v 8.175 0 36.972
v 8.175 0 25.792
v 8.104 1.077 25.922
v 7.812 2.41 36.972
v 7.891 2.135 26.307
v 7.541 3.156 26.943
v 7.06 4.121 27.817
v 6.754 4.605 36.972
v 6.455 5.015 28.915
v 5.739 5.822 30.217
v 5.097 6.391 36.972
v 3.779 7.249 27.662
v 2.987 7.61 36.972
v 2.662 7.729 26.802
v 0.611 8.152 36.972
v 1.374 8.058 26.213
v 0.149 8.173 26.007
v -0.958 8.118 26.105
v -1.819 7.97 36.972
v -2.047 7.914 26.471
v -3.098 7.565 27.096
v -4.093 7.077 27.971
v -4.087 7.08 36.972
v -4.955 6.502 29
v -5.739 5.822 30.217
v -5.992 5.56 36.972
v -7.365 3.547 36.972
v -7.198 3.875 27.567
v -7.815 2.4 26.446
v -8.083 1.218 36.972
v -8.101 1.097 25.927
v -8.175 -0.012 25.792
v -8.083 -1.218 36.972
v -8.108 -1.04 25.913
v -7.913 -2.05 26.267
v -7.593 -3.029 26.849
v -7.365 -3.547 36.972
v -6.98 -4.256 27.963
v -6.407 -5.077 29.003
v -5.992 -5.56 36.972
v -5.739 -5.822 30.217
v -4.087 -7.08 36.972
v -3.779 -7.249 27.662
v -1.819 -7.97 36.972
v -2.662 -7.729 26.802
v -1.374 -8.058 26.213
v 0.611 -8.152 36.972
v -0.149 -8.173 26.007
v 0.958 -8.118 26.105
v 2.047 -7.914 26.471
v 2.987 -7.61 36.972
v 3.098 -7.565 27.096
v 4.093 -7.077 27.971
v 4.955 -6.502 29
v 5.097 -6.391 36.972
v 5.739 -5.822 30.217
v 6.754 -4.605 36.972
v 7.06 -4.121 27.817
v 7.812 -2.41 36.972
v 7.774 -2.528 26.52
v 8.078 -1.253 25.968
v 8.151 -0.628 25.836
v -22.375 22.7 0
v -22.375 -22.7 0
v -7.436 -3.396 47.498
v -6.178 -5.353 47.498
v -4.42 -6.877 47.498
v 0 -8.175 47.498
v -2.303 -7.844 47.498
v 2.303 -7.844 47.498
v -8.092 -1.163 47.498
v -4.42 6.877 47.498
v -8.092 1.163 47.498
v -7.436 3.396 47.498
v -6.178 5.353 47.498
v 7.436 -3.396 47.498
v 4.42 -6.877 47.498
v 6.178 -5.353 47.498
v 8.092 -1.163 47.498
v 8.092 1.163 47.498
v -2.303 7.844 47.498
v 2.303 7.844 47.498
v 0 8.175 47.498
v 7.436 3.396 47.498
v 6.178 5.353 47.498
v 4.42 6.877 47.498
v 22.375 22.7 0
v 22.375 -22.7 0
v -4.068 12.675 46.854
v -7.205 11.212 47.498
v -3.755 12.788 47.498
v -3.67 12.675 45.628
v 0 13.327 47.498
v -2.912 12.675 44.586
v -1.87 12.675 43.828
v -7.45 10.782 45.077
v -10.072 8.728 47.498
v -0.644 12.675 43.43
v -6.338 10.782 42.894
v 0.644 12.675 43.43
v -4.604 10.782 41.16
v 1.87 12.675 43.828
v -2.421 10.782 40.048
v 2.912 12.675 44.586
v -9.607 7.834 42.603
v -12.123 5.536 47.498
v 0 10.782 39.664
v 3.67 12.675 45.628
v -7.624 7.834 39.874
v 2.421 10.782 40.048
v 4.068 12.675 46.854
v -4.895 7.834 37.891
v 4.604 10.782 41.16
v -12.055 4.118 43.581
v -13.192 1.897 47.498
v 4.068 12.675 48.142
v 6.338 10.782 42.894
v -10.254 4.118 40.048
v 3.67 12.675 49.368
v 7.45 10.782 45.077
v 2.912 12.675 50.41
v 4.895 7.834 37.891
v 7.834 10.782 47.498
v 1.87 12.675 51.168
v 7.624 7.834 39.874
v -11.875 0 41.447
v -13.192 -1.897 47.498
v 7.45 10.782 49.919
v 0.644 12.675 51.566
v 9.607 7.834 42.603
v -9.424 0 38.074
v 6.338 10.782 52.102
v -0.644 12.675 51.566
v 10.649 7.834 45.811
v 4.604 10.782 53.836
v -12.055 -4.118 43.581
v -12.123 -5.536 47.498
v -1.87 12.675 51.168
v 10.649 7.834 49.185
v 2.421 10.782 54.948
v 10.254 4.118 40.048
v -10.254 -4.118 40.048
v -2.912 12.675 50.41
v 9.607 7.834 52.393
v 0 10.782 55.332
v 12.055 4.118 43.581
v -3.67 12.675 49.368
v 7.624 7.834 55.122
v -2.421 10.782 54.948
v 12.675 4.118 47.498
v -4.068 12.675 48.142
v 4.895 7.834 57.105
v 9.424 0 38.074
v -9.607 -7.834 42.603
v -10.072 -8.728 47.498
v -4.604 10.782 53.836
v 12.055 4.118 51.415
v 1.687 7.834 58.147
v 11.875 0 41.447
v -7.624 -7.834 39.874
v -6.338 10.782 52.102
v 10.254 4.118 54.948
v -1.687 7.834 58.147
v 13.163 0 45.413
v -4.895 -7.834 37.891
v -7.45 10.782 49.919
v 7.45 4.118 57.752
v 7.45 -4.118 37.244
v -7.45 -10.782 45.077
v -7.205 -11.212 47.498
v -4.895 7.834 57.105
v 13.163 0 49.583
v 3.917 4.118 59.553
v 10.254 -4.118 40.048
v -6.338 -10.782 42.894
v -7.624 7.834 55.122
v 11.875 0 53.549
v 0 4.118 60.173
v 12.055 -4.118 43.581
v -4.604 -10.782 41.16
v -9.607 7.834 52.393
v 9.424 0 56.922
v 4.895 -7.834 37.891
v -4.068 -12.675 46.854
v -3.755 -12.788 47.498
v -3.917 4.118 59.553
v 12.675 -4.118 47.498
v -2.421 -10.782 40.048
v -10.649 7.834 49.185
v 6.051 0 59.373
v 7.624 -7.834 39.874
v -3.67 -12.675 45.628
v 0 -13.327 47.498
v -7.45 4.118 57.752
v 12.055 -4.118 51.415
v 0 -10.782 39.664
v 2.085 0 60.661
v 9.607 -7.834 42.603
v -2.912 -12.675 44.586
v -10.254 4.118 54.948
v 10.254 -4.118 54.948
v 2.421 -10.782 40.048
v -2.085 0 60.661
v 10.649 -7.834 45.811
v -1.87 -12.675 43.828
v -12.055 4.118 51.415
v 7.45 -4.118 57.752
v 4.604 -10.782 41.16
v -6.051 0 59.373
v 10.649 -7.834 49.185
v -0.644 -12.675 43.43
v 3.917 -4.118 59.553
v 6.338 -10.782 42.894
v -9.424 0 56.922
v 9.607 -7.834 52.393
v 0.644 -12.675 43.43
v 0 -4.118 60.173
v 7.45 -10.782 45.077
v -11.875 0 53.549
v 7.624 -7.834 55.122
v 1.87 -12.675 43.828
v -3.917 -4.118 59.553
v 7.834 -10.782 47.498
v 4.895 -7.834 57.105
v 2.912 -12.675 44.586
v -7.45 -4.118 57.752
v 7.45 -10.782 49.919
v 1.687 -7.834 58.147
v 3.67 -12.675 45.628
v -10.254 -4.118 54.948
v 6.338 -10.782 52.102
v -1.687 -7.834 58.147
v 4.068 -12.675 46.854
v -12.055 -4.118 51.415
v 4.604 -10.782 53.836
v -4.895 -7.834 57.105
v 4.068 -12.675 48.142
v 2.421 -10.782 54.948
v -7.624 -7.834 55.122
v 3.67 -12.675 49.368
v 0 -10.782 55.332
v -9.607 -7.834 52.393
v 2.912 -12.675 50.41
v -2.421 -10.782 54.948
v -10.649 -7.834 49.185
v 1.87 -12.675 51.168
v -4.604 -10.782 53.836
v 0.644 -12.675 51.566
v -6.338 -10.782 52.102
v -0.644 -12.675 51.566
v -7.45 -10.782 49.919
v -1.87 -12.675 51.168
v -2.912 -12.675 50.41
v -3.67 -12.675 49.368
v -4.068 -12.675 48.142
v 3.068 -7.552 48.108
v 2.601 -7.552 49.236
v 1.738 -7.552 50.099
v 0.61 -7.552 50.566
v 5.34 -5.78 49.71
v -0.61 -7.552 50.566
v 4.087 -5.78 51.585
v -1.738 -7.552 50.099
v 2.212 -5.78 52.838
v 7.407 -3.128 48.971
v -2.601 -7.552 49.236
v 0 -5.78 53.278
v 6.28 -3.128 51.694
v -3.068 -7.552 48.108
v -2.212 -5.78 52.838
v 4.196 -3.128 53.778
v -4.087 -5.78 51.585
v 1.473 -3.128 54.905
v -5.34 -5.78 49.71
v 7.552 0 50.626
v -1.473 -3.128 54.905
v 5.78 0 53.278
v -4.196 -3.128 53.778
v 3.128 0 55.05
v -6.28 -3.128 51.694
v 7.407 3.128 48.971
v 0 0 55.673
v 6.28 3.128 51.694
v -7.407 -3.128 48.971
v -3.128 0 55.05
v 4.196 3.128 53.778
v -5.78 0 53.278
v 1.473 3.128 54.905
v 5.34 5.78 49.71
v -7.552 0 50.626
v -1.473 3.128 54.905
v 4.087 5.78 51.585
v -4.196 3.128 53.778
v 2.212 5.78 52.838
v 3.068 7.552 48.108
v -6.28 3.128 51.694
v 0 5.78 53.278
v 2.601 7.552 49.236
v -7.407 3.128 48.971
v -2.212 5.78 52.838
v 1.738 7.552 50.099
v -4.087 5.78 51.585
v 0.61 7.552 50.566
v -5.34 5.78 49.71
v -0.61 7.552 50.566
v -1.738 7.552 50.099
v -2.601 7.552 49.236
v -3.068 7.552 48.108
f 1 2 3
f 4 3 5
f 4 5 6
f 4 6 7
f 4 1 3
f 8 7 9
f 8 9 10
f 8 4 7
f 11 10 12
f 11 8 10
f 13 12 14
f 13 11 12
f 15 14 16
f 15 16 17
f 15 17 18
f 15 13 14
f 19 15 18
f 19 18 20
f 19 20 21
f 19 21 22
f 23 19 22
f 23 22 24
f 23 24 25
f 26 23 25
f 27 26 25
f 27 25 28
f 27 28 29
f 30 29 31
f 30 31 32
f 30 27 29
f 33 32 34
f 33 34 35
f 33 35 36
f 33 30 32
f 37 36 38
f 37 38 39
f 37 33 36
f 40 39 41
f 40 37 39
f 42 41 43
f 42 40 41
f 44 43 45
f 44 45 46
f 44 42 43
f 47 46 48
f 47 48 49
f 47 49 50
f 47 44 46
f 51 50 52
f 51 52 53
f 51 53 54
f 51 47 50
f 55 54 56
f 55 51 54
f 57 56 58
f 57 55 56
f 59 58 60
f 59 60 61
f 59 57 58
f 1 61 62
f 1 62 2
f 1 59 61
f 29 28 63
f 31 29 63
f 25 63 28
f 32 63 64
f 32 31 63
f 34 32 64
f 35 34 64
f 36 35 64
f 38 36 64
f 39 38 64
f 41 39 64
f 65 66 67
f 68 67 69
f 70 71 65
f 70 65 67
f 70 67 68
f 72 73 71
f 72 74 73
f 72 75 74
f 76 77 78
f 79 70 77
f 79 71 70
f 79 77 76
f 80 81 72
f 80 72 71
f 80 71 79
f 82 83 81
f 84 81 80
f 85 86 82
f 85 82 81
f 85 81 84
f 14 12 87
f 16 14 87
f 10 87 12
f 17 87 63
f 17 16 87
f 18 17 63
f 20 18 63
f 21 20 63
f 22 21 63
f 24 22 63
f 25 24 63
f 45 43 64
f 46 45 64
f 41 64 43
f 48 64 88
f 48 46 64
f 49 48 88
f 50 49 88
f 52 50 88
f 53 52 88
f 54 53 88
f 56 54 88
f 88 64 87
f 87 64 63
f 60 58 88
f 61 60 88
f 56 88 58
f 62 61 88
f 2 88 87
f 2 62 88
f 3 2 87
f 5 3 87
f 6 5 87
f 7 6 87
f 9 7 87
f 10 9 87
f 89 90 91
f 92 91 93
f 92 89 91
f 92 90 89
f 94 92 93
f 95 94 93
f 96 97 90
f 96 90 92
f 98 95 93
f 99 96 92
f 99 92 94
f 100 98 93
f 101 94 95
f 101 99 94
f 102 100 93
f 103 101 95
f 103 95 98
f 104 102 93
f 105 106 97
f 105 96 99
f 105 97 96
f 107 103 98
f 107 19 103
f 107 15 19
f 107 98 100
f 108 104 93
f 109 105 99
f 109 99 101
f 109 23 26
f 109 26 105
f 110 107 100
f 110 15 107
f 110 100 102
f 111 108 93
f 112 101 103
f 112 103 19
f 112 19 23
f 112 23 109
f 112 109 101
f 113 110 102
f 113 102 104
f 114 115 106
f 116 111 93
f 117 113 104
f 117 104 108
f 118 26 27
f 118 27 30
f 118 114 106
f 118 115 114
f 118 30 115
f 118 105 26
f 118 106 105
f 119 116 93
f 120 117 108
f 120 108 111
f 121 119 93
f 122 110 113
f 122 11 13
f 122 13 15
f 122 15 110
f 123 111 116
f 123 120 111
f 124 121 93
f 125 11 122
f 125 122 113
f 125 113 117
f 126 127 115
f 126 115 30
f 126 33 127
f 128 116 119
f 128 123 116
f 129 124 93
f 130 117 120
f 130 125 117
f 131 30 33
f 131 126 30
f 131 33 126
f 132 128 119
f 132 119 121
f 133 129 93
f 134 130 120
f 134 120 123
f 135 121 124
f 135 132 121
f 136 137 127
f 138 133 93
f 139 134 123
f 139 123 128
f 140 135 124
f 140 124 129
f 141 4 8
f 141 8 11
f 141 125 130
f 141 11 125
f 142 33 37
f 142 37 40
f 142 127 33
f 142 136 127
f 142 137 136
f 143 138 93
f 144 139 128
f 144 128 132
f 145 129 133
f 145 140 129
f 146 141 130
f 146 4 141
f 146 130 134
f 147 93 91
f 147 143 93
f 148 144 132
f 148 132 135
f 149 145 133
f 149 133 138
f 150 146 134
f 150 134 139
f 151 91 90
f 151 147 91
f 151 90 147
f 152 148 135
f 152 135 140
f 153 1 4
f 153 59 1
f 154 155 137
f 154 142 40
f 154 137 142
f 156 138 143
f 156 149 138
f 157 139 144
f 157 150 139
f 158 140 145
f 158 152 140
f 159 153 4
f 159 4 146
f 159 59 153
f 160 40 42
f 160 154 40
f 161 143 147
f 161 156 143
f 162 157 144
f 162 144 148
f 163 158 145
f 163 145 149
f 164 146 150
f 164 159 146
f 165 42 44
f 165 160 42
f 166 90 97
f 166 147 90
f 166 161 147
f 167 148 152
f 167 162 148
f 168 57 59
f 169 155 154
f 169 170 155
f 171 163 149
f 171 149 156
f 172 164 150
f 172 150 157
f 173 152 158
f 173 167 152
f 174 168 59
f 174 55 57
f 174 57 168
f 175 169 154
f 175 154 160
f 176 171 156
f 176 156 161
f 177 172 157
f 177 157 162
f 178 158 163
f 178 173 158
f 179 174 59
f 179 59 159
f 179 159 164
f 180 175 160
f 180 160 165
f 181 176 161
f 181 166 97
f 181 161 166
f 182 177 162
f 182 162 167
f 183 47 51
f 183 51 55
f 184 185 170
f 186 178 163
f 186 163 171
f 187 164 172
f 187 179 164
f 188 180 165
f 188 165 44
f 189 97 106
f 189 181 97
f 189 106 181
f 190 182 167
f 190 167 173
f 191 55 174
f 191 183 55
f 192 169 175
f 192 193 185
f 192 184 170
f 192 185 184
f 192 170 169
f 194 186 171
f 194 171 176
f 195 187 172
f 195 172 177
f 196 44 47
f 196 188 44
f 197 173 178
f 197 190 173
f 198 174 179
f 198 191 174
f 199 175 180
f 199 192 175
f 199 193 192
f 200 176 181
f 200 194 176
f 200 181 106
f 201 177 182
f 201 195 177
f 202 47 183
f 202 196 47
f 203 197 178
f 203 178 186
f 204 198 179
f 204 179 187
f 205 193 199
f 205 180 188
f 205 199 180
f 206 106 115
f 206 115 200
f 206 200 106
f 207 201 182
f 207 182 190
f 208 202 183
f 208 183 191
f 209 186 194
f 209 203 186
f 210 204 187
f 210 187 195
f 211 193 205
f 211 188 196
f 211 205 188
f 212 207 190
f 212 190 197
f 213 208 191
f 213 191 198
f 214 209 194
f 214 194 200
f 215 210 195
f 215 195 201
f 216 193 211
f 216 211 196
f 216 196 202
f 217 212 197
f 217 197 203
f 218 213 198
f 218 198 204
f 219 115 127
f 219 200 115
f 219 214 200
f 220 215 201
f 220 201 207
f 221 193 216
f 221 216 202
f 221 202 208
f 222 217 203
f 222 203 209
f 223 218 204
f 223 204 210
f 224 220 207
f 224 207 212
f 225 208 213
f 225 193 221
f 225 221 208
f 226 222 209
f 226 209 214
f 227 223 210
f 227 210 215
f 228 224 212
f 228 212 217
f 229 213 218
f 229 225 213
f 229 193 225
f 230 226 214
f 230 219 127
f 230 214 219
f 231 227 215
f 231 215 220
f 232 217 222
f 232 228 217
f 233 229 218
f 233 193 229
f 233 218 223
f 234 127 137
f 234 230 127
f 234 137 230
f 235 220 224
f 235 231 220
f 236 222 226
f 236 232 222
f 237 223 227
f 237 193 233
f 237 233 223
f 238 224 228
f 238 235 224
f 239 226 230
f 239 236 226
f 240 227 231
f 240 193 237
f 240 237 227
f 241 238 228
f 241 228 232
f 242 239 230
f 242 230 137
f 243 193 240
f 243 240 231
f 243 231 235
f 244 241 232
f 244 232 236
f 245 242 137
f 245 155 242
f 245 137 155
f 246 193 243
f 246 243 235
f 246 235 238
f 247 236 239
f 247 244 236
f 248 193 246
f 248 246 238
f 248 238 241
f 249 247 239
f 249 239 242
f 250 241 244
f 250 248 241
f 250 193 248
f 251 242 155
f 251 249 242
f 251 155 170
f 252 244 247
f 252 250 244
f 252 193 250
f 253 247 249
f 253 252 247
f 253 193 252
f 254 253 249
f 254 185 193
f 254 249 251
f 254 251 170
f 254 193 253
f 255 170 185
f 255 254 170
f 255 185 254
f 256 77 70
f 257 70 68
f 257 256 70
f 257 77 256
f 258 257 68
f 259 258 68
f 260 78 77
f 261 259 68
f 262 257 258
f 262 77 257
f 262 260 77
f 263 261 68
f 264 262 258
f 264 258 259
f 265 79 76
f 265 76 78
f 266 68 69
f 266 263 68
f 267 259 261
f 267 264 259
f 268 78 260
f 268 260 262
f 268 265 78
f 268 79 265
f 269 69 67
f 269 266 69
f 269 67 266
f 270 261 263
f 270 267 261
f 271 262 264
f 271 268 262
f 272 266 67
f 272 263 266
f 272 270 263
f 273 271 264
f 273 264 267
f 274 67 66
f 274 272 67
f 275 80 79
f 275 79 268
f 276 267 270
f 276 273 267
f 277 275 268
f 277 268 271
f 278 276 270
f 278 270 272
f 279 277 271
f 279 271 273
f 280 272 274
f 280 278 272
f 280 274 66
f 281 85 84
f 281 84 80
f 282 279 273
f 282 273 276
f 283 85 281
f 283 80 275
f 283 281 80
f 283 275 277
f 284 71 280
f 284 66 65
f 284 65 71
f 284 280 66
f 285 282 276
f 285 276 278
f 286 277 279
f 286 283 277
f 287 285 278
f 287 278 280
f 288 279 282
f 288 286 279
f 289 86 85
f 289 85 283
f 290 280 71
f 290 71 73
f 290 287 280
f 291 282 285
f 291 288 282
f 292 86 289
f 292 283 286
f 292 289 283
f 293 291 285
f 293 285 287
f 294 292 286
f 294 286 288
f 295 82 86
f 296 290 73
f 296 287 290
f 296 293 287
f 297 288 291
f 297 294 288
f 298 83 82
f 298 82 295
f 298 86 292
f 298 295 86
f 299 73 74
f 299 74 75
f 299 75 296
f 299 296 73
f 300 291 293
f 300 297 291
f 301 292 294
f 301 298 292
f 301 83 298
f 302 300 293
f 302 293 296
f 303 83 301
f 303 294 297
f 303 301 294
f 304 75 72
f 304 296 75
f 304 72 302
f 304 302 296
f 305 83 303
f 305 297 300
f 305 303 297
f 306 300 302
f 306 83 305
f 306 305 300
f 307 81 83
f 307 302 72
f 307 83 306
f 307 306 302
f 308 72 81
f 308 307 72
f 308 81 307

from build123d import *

# Parameters (mm, degrees)
F1_W          = 44.750304
F1_H          = 45.399402
F2_R          = 8.174725
F4_DEPTH      = 6.858
F4_DEPTH_BACK = 30.48


with BuildPart() as f3:
    # F1 (on Top) → F3 section 0
    with BuildSketch(Plane.XY, mode=Mode.PRIVATE) as f3_s0:
        Rectangle(F1_W, F1_H)
    loft([f3_s0.sketch, Vertex(0, 0, 40.64)])

    # F2 (on offset) → F4 (join, two sides)
    with BuildSketch(Plane.XY.offset(40.64)) as f4_sk:
        Circle(F2_R)
    extrude(amount=F4_DEPTH)
    extrude(f4_sk.sketch, amount=-F4_DEPTH_BACK)

    # F5 (on face) → F6 (revolve)
    with BuildSketch(Plane.XY.offset(47.498)):
        with BuildLine():
            Line((0, 8.174725), (0, 13.327389))
            ThreePointArc((0, 13.327389), (-13.327389, 0), (0, -13.327389))
            Line((0, -13.327389), (0, -8.174725))
            ThreePointArc((0, -8.174725), (-8.174725, 0), (0, 8.174725))
        make_face()
    revolve(axis=Axis((0, 0, 47.498), (0, -1, 0)))


solid = f3.part
